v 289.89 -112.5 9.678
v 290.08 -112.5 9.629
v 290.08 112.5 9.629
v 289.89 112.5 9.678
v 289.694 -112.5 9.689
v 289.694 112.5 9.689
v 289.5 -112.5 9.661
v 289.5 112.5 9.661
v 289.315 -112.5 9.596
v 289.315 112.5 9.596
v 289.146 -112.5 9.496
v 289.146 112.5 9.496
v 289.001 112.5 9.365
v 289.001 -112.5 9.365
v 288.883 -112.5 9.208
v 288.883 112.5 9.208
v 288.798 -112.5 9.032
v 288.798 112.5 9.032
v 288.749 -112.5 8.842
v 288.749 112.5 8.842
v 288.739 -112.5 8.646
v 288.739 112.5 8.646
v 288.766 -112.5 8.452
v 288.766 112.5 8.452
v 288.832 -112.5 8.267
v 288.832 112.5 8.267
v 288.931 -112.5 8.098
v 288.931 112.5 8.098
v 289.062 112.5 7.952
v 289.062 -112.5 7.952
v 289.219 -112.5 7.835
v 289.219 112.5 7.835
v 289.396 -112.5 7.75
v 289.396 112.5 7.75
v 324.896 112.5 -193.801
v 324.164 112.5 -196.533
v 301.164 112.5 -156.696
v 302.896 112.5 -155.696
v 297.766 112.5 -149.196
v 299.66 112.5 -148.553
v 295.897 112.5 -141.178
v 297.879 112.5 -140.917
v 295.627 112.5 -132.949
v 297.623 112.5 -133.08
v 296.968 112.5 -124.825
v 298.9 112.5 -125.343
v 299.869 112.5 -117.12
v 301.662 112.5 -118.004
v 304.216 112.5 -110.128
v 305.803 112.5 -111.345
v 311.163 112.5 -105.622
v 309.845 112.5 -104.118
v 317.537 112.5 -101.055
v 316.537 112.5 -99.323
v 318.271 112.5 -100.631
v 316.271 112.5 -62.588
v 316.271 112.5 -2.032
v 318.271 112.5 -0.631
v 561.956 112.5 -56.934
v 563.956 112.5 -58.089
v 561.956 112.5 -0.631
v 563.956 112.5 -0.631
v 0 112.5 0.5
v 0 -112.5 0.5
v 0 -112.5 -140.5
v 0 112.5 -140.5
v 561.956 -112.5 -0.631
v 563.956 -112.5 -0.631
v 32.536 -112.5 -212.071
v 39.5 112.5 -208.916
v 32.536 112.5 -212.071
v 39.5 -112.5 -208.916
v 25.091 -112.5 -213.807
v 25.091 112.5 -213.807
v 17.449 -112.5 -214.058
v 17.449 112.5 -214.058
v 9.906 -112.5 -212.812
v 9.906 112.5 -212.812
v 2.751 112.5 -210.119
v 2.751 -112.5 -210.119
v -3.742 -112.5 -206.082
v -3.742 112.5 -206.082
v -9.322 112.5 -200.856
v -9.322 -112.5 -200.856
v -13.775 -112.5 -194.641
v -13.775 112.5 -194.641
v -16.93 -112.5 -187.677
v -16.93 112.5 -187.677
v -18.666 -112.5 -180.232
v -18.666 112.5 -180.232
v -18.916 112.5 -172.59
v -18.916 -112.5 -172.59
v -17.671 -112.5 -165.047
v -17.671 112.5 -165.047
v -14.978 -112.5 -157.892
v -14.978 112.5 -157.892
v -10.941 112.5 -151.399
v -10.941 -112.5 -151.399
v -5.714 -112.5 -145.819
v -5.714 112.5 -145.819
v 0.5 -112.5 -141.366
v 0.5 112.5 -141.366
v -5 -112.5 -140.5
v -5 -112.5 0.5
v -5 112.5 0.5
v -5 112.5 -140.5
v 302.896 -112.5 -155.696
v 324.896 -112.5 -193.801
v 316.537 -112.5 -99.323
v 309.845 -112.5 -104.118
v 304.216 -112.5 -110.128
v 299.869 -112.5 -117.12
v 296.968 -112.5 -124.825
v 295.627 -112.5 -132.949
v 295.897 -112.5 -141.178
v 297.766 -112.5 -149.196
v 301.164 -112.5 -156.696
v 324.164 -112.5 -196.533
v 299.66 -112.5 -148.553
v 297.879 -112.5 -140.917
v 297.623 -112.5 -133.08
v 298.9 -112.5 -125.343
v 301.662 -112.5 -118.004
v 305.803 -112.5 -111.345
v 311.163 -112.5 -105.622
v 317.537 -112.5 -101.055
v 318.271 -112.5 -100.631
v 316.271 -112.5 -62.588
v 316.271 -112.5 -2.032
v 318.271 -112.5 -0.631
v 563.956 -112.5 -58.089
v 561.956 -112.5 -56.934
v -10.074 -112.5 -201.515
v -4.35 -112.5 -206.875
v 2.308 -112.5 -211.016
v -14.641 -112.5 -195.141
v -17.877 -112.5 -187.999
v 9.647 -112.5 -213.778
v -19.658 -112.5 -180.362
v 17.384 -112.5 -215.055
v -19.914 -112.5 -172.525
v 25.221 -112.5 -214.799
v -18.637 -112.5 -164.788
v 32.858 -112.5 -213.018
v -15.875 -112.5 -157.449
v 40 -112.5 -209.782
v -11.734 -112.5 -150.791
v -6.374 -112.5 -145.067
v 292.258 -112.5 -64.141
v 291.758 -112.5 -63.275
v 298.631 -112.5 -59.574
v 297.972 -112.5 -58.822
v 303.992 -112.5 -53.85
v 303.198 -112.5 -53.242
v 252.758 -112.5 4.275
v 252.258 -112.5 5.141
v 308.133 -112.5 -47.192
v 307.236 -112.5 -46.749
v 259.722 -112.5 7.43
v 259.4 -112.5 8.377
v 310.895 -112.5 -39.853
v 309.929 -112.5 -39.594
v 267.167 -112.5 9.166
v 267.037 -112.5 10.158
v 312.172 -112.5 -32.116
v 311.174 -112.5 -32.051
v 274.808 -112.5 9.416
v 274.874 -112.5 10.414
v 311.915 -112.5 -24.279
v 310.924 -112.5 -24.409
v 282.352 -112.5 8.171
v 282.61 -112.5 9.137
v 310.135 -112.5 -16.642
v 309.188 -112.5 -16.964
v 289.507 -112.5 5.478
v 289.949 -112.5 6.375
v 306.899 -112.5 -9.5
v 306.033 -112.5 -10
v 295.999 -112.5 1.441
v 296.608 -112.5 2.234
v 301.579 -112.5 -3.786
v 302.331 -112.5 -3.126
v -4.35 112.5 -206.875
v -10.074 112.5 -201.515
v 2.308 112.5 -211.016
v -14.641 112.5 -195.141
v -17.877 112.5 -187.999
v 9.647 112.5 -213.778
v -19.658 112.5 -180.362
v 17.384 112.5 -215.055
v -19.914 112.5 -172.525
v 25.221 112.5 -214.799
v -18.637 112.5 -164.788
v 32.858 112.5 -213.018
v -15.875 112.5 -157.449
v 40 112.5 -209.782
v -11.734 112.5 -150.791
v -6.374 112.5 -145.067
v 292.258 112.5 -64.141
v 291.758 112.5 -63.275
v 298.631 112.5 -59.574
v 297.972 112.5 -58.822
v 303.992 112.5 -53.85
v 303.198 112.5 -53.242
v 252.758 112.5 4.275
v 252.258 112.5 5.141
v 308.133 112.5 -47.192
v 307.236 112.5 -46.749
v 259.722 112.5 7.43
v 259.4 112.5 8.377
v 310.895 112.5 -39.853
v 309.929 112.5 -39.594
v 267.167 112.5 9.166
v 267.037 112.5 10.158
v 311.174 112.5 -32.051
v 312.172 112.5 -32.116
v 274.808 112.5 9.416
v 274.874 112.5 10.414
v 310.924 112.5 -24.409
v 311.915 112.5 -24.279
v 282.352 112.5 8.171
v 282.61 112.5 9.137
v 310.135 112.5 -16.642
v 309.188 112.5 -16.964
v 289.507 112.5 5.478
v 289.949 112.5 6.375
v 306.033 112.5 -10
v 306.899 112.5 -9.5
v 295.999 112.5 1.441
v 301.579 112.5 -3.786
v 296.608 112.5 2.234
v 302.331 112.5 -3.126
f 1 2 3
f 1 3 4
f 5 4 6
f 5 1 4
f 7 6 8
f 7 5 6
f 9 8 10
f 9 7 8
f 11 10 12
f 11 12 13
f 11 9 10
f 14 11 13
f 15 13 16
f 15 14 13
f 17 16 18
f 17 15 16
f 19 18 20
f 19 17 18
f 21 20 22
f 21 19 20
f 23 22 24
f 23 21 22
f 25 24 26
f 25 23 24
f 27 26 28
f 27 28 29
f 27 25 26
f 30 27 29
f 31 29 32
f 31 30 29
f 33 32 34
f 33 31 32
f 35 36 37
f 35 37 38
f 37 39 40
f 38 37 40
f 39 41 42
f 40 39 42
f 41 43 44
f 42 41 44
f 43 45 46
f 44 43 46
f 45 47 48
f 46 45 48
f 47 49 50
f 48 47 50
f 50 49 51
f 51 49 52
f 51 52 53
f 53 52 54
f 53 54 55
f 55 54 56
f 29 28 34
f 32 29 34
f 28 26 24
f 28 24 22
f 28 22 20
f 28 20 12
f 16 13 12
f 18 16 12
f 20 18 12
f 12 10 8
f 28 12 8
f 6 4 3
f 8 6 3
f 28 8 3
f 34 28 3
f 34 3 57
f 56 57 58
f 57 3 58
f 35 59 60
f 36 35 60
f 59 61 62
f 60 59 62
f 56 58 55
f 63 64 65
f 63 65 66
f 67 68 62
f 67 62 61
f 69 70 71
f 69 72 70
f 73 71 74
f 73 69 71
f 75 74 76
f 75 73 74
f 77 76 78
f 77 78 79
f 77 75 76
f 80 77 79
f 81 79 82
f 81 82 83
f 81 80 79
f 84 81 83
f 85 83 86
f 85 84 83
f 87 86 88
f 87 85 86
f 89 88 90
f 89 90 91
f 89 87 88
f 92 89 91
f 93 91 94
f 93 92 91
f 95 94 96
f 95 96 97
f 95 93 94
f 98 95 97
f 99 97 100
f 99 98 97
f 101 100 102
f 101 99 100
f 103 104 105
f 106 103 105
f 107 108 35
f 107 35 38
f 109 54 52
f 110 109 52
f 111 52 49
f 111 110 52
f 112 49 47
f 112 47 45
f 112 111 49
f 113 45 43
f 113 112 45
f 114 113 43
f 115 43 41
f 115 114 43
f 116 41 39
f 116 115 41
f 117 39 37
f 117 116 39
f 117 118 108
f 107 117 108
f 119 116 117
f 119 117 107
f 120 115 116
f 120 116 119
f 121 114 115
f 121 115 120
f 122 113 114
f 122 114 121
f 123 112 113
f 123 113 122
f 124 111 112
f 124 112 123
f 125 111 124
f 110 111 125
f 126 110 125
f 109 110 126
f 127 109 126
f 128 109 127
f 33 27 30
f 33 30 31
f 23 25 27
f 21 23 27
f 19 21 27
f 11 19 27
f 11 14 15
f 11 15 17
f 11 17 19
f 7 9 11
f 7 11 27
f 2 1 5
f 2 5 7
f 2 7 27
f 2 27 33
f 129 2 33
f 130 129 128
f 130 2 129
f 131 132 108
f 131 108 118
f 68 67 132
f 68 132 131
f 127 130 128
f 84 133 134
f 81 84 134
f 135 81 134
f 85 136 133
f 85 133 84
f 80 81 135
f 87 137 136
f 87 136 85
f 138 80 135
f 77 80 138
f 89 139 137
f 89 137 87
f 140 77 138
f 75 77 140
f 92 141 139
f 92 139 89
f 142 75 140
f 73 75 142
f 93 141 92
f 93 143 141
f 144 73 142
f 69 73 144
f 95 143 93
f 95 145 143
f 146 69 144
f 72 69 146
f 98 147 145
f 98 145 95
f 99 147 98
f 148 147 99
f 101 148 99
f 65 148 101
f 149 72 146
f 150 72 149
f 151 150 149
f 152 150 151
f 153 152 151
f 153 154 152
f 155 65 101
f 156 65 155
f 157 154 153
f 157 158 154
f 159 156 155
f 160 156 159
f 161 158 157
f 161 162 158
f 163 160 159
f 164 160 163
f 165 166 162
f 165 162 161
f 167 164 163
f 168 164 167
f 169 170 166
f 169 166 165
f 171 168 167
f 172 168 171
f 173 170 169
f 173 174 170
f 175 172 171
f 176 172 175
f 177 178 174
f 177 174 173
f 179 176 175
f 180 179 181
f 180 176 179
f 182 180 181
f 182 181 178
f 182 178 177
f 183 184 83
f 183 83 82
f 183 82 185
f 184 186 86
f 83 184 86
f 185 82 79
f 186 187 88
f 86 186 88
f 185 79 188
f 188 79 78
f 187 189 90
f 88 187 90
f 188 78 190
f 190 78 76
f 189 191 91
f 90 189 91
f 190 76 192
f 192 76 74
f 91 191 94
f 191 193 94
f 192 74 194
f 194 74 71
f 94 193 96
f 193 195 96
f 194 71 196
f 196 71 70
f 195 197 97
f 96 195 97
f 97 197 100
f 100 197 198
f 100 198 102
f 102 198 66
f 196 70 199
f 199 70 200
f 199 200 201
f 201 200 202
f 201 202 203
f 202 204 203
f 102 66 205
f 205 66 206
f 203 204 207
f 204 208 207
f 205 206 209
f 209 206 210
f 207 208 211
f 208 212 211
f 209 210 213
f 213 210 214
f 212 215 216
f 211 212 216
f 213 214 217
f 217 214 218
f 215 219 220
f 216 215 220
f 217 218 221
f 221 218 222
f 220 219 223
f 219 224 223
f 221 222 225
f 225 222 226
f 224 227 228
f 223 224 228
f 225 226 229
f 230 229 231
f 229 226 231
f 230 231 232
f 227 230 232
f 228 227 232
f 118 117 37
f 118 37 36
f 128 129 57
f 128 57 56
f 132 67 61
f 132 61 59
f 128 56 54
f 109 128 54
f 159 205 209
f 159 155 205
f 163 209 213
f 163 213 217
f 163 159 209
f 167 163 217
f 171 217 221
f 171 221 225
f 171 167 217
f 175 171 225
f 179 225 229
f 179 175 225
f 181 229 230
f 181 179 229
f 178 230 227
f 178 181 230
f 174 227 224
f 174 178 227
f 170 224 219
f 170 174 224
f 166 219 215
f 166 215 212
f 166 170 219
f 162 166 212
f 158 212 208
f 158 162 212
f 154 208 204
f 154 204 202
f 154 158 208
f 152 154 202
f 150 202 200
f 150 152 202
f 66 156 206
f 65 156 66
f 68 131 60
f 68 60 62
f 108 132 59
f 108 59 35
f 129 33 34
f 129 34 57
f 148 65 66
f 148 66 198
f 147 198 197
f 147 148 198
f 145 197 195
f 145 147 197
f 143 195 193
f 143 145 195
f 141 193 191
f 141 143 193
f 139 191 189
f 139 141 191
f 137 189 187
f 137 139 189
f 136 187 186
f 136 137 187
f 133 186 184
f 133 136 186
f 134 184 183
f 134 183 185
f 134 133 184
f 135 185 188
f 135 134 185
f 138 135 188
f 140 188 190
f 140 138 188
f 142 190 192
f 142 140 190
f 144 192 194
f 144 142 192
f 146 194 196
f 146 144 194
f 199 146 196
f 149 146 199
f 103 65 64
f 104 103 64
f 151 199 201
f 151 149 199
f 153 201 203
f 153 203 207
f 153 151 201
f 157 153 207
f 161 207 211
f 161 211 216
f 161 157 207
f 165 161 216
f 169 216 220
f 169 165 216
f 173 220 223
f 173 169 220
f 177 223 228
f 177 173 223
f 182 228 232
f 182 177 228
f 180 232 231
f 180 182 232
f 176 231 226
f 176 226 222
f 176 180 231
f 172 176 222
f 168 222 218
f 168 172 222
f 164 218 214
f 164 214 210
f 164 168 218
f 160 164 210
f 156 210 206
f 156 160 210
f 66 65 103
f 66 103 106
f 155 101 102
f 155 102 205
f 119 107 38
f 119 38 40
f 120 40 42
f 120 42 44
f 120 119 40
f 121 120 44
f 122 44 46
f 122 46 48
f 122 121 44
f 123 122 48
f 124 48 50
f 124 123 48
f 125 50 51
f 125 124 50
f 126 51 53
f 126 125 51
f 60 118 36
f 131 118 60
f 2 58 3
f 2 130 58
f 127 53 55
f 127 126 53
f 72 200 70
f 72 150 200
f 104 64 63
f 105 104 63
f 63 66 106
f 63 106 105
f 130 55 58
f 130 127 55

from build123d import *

# Parameters (mm, degrees)
F1_W     = 225
F1_H     = 141
F2_DEPTH = 5
F4_DEPTH = 112.5
F6_DEPTH = 112.5


with BuildPart() as f2:
    # F1 (on Right) → F2 (new body)
    with BuildSketch(Plane.YZ):
        with Locations((0, -70)):
            Rectangle(F1_W, F1_H)
    extrude(amount=-F2_DEPTH)


with BuildPart() as f4:
    # F3 (on Front) → F4 (new body, symmetric)
    with BuildSketch(Plane.XZ):
        with BuildLine():
            ThreePointArc((292.2576396401, -64.1410161514), (306.8986557915, -9.5), (252.2576396401, 5.1410161514))
            Line((252.2576396401, 5.1410161514), (0, -140.5))
            ThreePointArc((0, -140.5), (-14.6410161514, -195.1410161514), (40, -209.7820323028))
            Line((40, -209.7820323028), (292.2576396401, -64.1410161514))
        make_face()
        with BuildLine():
            Line((0.5, -141.3660254038), (252.7576396401, 4.2749907476))
            ThreePointArc((252.7576396401, 4.2749907476), (306.0326303877, -10), (291.7576396401, -63.2749907476))
            Line((291.7576396401, -63.2749907476), (39.5, -208.916006899))
            ThreePointArc((39.5, -208.916006899), (-13.7749907476, -194.6410161514), (0.5, -141.3660254038))
        make_face(mode=Mode.SUBTRACT)
    extrude(amount=F4_DEPTH, both=True)


with BuildPart() as f6:
    # F5 (on Front) → F6 (new body, symmetric)
    with BuildSketch(Plane.XZ):
        with BuildLine():
            Line((318.2706068249, -0.631335718), (290.0798282014, 9.6292685818))
            ThreePointArc((290.0798282014, 9.6292685818), (288.7981154373, 9.0315961043), (289.3957879147, 7.7498833402))
            Line((289.3957879147, 7.7498833402), (316.2706068249, -2.0317507944))
            Line((316.2706068249, -2.0317507944), (316.2706068249, -62.5876359349))
            Line((316.2706068249, -62.5876359349), (316.5372552159, -99.3226856593))
            ThreePointArc((316.5372552159, -99.3226856593), (296.9683705117, -124.825352724), (301.1641882569, -156.6957526183))
            Line((301.1641882569, -156.6957526183), (324.1641882569, -196.5329211923))
            Line((324.1641882569, -196.5329211923), (563.9560193135, -58.0890429824))
            Line((563.9560193135, -58.0890429824), (563.9560193135, -0.631335718))
            Line((563.9560193135, -0.631335718), (561.9560193135, -0.631335718))
            Line((561.9560193135, -0.631335718), (561.9560193135, -56.934342444))
            Line((561.9560193135, -56.934342444), (324.8962390645, -193.8008703848))
            Line((324.8962390645, -193.8008703848), (302.8962390645, -155.6957526183))
            ThreePointArc((302.8962390645, -155.6957526183), (298.9002221643, -125.3429908142), (317.5372552159, -101.0547364669))
            Line((317.5372552159, -101.0547364669), (318.2706068249, -100.631335718))
            Line((318.2706068249, -100.631335718), (318.2706068249, -0.631335718))
        make_face()
    extrude(amount=F6_DEPTH, both=True)


solid = Compound([f2.part, f4.part, f6.part])
